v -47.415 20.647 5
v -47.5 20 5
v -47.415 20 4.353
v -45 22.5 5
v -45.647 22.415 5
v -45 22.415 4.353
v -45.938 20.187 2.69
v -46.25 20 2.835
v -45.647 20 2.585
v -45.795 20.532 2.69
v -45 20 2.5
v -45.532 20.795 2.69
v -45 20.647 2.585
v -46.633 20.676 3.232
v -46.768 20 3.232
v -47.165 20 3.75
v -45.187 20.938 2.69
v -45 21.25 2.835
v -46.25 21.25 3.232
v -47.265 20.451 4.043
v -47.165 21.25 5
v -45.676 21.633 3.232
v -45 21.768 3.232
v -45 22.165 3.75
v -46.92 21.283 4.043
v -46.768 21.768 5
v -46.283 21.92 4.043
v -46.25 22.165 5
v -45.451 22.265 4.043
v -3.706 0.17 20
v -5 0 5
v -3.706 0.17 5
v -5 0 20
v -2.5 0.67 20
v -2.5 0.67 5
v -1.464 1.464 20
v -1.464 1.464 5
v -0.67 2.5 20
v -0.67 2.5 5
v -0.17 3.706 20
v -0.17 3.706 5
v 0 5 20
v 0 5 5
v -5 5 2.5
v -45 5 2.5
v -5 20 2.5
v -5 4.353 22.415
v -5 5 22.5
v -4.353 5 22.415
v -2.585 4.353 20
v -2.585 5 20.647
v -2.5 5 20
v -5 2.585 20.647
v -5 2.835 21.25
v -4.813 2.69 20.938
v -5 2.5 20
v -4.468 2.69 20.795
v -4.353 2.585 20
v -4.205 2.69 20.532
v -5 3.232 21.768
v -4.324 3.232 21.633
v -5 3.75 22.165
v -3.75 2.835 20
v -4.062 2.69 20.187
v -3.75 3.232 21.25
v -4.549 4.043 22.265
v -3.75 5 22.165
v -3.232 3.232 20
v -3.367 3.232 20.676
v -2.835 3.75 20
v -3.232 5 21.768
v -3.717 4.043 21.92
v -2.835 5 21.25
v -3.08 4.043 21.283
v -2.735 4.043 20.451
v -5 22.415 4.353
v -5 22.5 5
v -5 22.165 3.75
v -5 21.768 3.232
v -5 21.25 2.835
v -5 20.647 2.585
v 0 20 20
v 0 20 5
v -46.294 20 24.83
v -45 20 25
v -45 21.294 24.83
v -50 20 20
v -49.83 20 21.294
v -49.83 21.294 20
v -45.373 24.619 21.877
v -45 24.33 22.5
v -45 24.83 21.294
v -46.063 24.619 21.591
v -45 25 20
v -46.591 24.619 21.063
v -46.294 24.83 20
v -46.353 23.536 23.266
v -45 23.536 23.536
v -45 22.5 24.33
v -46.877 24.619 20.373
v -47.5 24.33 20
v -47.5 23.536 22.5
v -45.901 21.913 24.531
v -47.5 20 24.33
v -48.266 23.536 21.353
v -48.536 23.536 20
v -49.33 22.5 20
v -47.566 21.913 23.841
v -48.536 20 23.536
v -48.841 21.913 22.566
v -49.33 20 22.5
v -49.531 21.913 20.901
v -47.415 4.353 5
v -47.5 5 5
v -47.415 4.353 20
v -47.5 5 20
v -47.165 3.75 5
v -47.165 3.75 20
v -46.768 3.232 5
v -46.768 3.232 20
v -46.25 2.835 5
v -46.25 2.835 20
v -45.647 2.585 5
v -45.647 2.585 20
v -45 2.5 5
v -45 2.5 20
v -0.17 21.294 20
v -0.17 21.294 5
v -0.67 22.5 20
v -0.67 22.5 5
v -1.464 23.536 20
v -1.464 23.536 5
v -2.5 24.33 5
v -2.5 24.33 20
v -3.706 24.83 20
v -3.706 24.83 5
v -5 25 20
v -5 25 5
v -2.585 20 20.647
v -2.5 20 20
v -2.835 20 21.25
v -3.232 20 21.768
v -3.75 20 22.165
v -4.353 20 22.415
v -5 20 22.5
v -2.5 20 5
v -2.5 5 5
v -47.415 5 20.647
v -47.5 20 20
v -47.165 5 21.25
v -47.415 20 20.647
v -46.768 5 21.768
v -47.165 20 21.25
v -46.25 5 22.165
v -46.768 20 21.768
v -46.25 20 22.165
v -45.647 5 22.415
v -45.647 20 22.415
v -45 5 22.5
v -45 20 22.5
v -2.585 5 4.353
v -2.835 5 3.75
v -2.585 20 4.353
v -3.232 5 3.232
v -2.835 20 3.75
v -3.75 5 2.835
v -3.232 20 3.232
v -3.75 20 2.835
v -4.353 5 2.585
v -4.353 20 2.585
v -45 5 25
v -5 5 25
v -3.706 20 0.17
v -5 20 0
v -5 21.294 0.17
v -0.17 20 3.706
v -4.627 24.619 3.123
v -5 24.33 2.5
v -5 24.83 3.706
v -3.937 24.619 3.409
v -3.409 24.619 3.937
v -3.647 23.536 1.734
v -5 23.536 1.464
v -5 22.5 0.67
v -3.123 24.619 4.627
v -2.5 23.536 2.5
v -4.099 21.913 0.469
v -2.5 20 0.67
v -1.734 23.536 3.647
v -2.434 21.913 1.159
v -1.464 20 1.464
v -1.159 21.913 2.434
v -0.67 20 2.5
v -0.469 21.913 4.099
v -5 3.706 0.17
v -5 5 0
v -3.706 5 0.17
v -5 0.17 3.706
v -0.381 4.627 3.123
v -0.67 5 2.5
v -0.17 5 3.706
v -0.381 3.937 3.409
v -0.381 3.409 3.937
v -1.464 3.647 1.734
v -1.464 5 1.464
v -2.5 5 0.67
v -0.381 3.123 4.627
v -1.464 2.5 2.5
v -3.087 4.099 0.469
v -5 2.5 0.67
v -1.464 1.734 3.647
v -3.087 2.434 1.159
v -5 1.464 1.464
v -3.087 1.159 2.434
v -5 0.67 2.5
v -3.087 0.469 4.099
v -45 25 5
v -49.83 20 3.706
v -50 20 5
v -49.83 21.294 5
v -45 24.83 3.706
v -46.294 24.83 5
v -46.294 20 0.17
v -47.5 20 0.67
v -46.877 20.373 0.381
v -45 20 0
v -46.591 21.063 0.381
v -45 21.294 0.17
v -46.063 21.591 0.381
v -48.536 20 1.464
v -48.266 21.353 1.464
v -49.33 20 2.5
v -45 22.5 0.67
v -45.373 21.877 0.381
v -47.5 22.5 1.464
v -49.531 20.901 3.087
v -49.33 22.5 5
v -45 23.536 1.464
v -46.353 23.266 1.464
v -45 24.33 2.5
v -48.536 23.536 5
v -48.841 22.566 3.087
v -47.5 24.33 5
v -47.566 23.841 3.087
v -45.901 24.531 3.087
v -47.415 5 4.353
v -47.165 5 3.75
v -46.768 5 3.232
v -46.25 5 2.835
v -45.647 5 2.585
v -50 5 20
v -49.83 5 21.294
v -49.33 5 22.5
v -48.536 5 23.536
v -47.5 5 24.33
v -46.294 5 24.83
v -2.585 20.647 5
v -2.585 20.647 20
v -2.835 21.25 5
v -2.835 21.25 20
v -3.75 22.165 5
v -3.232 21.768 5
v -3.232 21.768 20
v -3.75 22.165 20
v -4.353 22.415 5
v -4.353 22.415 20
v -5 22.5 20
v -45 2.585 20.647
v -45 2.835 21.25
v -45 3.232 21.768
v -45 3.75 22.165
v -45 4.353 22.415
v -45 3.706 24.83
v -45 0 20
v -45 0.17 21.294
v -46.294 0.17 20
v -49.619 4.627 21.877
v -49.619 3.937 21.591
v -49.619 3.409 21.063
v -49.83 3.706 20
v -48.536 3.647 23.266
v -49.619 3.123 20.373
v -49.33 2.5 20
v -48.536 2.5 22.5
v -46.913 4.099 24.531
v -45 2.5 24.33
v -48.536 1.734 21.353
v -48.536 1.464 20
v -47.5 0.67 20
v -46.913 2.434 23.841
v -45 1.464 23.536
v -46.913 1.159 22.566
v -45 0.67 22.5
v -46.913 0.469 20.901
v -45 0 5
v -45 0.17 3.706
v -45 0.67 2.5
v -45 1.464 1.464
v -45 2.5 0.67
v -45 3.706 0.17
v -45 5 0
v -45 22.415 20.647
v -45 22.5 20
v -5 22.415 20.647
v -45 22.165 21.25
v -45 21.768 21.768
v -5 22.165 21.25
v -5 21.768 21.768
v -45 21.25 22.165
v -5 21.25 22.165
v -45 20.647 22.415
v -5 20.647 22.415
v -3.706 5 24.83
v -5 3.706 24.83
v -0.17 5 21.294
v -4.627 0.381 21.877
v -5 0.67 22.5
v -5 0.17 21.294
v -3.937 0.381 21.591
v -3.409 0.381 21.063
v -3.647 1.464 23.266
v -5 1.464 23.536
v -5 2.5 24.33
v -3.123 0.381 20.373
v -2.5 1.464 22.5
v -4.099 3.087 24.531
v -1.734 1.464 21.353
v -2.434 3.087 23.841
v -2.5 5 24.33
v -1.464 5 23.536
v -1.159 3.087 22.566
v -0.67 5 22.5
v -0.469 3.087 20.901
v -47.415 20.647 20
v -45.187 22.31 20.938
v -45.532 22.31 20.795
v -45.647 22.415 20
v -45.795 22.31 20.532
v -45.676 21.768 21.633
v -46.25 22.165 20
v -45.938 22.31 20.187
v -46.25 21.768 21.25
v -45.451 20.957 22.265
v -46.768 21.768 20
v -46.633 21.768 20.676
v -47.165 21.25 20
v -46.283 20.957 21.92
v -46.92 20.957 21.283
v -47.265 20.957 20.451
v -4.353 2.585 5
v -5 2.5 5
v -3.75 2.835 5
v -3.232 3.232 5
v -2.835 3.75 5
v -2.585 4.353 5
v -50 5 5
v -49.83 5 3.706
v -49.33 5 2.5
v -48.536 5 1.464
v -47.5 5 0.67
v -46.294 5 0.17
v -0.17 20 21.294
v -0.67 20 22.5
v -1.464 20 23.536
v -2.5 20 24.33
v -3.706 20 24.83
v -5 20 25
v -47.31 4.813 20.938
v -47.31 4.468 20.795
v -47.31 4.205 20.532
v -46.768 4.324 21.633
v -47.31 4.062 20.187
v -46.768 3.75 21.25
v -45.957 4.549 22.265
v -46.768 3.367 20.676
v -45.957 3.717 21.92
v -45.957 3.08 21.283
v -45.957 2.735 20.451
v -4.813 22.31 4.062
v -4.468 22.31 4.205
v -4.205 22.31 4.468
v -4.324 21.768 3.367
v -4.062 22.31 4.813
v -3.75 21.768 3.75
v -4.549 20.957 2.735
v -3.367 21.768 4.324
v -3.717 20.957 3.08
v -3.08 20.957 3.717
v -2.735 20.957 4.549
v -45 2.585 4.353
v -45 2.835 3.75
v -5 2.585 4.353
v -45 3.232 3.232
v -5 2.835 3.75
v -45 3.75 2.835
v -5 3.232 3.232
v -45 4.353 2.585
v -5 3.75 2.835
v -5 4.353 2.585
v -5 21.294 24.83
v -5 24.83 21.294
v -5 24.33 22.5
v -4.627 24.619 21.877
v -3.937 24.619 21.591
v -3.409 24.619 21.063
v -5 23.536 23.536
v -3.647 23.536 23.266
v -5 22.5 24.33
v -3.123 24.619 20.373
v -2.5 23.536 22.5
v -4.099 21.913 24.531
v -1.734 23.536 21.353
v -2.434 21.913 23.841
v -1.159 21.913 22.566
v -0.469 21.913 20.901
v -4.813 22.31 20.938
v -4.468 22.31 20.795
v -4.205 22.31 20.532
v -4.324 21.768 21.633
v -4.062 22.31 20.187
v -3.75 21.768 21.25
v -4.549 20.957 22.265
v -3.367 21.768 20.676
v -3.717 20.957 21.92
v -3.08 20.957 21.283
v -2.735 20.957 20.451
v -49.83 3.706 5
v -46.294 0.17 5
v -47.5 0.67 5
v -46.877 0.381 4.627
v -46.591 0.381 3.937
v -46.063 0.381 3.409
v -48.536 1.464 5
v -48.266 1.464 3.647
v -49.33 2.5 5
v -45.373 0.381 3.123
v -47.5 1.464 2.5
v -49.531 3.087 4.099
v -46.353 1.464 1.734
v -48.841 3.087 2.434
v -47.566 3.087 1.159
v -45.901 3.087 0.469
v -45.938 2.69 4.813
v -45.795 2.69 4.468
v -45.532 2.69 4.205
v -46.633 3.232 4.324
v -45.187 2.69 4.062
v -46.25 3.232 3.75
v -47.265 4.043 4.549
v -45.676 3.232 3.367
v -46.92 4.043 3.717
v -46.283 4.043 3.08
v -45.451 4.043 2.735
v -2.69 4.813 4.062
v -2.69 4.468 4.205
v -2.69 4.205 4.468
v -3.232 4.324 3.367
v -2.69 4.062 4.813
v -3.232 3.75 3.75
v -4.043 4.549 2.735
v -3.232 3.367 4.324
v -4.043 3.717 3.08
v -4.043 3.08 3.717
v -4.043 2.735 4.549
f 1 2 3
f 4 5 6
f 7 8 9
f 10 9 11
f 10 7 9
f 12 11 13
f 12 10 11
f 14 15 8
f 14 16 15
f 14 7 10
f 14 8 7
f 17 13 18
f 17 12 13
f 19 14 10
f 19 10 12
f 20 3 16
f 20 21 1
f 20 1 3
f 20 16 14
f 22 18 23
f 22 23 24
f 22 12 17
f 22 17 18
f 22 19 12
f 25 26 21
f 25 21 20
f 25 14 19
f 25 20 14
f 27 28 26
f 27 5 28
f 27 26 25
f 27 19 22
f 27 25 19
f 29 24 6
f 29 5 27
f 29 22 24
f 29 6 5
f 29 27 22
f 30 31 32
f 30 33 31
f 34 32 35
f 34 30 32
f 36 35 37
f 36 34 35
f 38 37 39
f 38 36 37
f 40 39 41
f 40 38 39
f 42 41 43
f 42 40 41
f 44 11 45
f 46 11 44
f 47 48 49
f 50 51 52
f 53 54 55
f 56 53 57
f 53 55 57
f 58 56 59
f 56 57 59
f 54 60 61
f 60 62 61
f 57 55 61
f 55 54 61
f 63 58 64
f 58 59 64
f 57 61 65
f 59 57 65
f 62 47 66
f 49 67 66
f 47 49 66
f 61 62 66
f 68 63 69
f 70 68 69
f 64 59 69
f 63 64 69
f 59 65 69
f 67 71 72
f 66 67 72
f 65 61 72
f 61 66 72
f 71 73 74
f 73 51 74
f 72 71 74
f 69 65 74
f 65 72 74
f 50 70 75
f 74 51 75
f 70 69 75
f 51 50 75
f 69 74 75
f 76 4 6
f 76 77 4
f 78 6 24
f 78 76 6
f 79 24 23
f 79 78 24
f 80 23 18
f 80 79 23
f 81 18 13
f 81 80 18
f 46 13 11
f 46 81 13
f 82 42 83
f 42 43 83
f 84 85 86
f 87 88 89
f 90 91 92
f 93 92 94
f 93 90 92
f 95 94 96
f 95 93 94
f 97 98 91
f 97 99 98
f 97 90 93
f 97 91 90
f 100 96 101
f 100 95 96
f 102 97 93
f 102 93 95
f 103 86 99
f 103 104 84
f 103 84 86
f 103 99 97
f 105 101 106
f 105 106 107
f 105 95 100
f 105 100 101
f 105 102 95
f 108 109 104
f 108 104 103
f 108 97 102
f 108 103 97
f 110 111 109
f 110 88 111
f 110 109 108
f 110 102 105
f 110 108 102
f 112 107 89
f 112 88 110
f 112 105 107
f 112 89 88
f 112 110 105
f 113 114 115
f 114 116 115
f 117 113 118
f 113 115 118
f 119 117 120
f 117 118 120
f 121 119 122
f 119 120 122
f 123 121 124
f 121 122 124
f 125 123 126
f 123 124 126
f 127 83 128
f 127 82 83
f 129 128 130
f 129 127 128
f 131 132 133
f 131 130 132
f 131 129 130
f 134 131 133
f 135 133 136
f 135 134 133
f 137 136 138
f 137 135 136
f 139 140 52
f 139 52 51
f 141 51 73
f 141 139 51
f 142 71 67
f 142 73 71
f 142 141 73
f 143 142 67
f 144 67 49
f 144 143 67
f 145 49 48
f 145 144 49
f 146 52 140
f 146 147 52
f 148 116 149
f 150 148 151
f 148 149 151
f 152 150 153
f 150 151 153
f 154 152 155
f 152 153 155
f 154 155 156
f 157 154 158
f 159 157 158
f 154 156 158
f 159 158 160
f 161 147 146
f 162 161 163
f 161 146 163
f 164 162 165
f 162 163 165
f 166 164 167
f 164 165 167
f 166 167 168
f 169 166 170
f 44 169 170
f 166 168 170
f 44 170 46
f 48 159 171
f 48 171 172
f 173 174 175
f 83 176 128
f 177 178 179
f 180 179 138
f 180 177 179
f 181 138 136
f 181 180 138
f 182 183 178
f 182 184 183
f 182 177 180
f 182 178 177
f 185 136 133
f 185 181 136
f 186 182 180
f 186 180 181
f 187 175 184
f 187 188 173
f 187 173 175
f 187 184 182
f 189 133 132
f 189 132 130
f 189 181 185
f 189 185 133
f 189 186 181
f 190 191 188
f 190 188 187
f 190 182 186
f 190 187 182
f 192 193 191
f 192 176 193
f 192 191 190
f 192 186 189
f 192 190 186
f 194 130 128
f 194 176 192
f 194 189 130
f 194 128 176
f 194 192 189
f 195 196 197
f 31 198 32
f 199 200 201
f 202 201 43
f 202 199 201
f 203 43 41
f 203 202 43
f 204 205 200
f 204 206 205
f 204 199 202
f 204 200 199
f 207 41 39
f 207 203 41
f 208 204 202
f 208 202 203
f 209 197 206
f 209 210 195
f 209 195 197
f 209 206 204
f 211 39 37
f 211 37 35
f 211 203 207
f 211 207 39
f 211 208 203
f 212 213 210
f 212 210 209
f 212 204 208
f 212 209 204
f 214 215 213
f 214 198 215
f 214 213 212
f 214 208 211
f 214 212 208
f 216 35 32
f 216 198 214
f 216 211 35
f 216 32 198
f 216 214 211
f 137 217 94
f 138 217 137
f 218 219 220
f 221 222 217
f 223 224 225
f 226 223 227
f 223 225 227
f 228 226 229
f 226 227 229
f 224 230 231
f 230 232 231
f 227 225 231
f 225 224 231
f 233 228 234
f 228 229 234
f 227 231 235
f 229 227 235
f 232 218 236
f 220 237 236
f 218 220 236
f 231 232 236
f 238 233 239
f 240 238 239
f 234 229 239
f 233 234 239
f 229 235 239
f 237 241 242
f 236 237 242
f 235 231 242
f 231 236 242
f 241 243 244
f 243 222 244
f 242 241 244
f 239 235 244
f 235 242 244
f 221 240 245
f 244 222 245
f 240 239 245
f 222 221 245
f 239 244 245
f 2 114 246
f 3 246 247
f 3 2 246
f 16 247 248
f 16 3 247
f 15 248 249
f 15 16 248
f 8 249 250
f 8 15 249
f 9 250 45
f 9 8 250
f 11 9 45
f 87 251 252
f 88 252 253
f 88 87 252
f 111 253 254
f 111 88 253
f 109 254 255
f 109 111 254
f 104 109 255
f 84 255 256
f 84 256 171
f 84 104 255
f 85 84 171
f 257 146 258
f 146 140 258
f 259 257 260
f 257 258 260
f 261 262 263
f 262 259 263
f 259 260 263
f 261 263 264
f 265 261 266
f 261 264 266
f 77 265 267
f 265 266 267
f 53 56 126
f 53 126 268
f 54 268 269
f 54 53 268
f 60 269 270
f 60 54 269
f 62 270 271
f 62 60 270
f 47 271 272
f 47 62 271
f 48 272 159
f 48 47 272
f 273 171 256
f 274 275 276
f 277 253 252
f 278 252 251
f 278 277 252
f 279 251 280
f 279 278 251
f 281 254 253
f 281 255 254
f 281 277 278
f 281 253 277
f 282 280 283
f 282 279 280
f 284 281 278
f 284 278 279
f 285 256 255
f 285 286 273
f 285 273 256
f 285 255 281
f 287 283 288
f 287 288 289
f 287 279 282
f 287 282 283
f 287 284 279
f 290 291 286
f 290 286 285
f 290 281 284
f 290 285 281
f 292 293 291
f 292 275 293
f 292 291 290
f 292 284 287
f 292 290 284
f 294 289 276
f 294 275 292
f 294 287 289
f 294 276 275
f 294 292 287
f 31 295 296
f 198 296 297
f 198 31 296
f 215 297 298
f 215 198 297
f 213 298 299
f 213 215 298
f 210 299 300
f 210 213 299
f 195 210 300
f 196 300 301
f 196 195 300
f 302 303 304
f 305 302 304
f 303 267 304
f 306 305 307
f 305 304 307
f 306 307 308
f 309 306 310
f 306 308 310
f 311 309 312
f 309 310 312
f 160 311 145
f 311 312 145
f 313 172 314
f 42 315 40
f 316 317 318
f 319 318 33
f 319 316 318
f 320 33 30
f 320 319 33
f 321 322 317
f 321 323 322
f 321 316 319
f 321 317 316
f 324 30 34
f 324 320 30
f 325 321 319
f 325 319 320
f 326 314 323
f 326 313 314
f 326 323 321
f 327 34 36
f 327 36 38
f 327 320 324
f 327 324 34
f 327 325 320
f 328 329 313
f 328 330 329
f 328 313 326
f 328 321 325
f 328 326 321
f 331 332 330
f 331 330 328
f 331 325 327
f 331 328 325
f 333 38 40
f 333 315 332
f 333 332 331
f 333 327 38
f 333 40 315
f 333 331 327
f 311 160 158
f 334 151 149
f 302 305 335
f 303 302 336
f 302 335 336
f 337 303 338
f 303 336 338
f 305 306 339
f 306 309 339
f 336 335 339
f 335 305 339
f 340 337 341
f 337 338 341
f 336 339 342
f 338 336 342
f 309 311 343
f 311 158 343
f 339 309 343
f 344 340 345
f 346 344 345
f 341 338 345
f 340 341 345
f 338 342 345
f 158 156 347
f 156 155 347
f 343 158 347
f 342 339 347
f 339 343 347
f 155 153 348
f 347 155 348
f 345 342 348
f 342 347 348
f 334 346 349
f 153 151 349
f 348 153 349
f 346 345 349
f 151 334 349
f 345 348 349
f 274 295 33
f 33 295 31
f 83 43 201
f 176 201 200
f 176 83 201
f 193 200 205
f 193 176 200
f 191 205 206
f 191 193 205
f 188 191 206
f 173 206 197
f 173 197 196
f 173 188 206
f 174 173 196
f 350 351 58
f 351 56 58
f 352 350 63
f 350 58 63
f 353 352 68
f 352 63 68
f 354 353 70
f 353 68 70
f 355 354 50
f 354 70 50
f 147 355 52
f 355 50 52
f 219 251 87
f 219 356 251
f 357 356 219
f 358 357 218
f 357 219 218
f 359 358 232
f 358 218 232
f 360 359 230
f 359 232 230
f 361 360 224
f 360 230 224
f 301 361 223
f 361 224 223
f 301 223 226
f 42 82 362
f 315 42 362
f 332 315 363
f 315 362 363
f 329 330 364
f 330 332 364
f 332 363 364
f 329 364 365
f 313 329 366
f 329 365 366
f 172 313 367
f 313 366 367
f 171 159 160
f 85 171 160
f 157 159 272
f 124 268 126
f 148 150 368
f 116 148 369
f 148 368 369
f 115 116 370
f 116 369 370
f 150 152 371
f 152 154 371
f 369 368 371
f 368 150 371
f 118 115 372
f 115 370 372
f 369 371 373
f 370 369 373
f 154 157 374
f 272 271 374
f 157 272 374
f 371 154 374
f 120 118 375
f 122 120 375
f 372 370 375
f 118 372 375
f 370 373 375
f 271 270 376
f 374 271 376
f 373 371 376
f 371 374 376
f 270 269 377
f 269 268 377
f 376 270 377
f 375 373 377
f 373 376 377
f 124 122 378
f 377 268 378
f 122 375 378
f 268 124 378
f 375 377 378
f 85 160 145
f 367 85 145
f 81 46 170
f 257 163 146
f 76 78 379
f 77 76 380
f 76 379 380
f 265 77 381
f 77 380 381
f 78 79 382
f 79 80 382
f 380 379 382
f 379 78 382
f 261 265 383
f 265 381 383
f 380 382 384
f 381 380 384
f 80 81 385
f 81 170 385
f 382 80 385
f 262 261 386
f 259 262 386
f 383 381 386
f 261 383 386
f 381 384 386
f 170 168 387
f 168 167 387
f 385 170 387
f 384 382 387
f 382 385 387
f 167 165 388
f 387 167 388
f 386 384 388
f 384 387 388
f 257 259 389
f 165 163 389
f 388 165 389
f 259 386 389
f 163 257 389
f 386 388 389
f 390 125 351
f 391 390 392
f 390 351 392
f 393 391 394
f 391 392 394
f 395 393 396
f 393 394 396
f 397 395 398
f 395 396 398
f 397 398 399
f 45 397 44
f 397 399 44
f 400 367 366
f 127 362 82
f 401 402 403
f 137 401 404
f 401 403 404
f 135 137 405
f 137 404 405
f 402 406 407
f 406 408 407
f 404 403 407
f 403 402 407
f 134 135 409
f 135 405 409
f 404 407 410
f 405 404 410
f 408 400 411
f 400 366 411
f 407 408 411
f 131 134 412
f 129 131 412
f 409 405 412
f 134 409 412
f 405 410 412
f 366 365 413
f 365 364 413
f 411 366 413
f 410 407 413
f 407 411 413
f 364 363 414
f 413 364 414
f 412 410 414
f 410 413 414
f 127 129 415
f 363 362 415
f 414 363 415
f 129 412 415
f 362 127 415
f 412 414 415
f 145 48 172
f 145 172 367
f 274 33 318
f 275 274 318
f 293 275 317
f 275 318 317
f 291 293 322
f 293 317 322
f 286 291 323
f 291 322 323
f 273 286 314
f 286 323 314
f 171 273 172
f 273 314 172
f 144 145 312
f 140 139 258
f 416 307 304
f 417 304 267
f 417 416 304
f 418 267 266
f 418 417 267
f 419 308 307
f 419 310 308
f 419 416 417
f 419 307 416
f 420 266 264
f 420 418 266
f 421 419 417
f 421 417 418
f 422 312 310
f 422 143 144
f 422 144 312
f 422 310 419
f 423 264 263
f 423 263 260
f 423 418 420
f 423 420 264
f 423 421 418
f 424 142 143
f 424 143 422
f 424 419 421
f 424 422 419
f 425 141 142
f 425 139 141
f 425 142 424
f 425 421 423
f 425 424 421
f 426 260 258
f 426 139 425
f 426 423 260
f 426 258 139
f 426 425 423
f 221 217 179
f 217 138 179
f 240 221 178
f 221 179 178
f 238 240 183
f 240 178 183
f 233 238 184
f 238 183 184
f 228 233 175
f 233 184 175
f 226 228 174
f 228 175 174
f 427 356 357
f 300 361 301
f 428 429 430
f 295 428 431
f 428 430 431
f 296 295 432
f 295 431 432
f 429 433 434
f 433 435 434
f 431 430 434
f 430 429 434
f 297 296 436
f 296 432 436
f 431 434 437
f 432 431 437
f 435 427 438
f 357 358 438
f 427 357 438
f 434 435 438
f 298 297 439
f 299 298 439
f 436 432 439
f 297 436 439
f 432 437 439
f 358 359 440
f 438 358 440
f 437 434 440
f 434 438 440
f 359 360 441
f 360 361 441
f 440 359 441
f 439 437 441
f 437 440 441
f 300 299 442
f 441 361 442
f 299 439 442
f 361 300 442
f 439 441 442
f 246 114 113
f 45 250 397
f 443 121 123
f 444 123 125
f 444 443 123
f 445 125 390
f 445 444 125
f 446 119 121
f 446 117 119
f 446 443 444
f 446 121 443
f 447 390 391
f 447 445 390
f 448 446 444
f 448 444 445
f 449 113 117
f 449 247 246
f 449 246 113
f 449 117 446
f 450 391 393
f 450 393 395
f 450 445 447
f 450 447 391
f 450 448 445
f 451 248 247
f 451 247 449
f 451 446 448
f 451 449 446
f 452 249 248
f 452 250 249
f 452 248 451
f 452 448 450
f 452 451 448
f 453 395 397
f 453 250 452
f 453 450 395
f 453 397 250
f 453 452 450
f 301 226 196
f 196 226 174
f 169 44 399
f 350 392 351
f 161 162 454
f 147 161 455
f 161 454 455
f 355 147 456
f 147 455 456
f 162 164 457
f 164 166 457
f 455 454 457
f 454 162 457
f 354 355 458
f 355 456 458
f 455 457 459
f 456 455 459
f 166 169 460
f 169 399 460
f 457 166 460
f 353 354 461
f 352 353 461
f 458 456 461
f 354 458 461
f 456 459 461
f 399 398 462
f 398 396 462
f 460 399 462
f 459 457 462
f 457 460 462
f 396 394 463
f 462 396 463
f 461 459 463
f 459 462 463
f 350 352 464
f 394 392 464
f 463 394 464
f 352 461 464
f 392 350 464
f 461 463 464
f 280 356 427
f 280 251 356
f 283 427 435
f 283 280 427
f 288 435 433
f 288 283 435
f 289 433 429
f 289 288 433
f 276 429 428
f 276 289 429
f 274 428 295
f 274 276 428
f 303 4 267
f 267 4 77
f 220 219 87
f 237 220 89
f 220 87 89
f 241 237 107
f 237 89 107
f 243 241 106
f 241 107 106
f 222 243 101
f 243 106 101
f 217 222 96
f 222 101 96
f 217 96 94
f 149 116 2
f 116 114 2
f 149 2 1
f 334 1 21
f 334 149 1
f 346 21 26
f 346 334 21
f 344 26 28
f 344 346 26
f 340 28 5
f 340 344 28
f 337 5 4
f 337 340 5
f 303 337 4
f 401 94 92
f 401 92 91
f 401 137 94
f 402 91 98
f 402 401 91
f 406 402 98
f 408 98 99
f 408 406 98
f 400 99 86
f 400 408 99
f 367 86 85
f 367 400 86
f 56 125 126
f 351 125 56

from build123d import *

# Parameters (mm, degrees)
F0_W     = 50
F0_H     = 25
F1_DEPTH = 25
F2_R     = 5
F3_T     = -2.5


# Not quite as in the source:
# - a shell that OpenCascade refuses in one call is made with other operations: the cavity is built on its own and cut out


with BuildPart() as f1:
    # F0 (on Top) → F1 (new body)
    with BuildSketch(Plane.XY):
        with Locations((-25, 12.5)):
            Rectangle(F0_W, F0_H)
    extrude(amount=F1_DEPTH)

    # F2
    f2_edges = [f1.edges().sort_by_distance(p)[0] for p in [
        (0, 12.5, 25),
        (-25, 0, 25),
        (-50, 12.5, 25),
        (-25, 25, 25),
        (-50, 25, 12.5),
        (-50, 12.5, 0),
        (-50, 0, 12.5),
        (-25, 0, 0),
        (0, 12.5, 0),
        (-25, 25, 0),
        (0, 25, 12.5),
        (0, 0, 12.5),
    ]]
    fillet(f2_edges, radius=F2_R)

    # F3: a shell. OpenCascade refuses it in one call, so the cavity is built on its own and cut out:
    # the body offset inwards by the wall thickness, plus a prism from it out through each open face.
    f3_core = offset(f1.part, amount=F3_T, mode=Mode.PRIVATE)
    f3_exits = [f3_core.faces().sort_by_distance(p)[0] for p in [
        (-25, 12.5, 22.5),
    ]]
    add(f3_core, mode=Mode.SUBTRACT)
    extrude(f3_exits, amount=-F3_T, mode=Mode.SUBTRACT)


solid = f1.part
